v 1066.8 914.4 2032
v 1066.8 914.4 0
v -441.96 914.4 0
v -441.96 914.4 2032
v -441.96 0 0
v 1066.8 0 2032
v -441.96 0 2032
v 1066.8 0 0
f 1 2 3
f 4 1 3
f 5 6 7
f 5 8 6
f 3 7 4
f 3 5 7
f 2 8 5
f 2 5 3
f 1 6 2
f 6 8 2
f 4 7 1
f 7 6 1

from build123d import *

# Parameters (mm, degrees)
F0_W     = 1066.8
F0_H     = 914.4
F1_DEPTH = 1778
F2_DEPTH = 441.96
F3_DEPTH = 355.6
F4_DEPTH = 609.6


with BuildPart() as f1:
    # F0 (on Top) → F1 (new body)
    with BuildSketch(Plane.XY):
        with Locations((533.4, 457.2)):
            Rectangle(F0_W, F0_H)
    extrude(amount=F1_DEPTH)

    # F2 (add): a face of the model
    f2_faces = [f1.faces().sort_by_distance(p)[0] for p in [
        (0, 457.2, 889),
    ]]
    extrude(f2_faces, amount=F2_DEPTH)

    # F3 (cut): a face of the model
    f3_faces = [f1.faces().sort_by_distance(p)[0] for p in [
        (312.42, 457.2, 1778),
    ]]
    extrude(f3_faces, amount=-F3_DEPTH, mode=Mode.SUBTRACT)

    # F4 (add): a face of the model
    f4_faces = [f1.faces().sort_by_distance(p)[0] for p in [
        (312.42, 457.2, 1422.4),
    ]]
    extrude(f4_faces, amount=F4_DEPTH)


solid = f1.part
